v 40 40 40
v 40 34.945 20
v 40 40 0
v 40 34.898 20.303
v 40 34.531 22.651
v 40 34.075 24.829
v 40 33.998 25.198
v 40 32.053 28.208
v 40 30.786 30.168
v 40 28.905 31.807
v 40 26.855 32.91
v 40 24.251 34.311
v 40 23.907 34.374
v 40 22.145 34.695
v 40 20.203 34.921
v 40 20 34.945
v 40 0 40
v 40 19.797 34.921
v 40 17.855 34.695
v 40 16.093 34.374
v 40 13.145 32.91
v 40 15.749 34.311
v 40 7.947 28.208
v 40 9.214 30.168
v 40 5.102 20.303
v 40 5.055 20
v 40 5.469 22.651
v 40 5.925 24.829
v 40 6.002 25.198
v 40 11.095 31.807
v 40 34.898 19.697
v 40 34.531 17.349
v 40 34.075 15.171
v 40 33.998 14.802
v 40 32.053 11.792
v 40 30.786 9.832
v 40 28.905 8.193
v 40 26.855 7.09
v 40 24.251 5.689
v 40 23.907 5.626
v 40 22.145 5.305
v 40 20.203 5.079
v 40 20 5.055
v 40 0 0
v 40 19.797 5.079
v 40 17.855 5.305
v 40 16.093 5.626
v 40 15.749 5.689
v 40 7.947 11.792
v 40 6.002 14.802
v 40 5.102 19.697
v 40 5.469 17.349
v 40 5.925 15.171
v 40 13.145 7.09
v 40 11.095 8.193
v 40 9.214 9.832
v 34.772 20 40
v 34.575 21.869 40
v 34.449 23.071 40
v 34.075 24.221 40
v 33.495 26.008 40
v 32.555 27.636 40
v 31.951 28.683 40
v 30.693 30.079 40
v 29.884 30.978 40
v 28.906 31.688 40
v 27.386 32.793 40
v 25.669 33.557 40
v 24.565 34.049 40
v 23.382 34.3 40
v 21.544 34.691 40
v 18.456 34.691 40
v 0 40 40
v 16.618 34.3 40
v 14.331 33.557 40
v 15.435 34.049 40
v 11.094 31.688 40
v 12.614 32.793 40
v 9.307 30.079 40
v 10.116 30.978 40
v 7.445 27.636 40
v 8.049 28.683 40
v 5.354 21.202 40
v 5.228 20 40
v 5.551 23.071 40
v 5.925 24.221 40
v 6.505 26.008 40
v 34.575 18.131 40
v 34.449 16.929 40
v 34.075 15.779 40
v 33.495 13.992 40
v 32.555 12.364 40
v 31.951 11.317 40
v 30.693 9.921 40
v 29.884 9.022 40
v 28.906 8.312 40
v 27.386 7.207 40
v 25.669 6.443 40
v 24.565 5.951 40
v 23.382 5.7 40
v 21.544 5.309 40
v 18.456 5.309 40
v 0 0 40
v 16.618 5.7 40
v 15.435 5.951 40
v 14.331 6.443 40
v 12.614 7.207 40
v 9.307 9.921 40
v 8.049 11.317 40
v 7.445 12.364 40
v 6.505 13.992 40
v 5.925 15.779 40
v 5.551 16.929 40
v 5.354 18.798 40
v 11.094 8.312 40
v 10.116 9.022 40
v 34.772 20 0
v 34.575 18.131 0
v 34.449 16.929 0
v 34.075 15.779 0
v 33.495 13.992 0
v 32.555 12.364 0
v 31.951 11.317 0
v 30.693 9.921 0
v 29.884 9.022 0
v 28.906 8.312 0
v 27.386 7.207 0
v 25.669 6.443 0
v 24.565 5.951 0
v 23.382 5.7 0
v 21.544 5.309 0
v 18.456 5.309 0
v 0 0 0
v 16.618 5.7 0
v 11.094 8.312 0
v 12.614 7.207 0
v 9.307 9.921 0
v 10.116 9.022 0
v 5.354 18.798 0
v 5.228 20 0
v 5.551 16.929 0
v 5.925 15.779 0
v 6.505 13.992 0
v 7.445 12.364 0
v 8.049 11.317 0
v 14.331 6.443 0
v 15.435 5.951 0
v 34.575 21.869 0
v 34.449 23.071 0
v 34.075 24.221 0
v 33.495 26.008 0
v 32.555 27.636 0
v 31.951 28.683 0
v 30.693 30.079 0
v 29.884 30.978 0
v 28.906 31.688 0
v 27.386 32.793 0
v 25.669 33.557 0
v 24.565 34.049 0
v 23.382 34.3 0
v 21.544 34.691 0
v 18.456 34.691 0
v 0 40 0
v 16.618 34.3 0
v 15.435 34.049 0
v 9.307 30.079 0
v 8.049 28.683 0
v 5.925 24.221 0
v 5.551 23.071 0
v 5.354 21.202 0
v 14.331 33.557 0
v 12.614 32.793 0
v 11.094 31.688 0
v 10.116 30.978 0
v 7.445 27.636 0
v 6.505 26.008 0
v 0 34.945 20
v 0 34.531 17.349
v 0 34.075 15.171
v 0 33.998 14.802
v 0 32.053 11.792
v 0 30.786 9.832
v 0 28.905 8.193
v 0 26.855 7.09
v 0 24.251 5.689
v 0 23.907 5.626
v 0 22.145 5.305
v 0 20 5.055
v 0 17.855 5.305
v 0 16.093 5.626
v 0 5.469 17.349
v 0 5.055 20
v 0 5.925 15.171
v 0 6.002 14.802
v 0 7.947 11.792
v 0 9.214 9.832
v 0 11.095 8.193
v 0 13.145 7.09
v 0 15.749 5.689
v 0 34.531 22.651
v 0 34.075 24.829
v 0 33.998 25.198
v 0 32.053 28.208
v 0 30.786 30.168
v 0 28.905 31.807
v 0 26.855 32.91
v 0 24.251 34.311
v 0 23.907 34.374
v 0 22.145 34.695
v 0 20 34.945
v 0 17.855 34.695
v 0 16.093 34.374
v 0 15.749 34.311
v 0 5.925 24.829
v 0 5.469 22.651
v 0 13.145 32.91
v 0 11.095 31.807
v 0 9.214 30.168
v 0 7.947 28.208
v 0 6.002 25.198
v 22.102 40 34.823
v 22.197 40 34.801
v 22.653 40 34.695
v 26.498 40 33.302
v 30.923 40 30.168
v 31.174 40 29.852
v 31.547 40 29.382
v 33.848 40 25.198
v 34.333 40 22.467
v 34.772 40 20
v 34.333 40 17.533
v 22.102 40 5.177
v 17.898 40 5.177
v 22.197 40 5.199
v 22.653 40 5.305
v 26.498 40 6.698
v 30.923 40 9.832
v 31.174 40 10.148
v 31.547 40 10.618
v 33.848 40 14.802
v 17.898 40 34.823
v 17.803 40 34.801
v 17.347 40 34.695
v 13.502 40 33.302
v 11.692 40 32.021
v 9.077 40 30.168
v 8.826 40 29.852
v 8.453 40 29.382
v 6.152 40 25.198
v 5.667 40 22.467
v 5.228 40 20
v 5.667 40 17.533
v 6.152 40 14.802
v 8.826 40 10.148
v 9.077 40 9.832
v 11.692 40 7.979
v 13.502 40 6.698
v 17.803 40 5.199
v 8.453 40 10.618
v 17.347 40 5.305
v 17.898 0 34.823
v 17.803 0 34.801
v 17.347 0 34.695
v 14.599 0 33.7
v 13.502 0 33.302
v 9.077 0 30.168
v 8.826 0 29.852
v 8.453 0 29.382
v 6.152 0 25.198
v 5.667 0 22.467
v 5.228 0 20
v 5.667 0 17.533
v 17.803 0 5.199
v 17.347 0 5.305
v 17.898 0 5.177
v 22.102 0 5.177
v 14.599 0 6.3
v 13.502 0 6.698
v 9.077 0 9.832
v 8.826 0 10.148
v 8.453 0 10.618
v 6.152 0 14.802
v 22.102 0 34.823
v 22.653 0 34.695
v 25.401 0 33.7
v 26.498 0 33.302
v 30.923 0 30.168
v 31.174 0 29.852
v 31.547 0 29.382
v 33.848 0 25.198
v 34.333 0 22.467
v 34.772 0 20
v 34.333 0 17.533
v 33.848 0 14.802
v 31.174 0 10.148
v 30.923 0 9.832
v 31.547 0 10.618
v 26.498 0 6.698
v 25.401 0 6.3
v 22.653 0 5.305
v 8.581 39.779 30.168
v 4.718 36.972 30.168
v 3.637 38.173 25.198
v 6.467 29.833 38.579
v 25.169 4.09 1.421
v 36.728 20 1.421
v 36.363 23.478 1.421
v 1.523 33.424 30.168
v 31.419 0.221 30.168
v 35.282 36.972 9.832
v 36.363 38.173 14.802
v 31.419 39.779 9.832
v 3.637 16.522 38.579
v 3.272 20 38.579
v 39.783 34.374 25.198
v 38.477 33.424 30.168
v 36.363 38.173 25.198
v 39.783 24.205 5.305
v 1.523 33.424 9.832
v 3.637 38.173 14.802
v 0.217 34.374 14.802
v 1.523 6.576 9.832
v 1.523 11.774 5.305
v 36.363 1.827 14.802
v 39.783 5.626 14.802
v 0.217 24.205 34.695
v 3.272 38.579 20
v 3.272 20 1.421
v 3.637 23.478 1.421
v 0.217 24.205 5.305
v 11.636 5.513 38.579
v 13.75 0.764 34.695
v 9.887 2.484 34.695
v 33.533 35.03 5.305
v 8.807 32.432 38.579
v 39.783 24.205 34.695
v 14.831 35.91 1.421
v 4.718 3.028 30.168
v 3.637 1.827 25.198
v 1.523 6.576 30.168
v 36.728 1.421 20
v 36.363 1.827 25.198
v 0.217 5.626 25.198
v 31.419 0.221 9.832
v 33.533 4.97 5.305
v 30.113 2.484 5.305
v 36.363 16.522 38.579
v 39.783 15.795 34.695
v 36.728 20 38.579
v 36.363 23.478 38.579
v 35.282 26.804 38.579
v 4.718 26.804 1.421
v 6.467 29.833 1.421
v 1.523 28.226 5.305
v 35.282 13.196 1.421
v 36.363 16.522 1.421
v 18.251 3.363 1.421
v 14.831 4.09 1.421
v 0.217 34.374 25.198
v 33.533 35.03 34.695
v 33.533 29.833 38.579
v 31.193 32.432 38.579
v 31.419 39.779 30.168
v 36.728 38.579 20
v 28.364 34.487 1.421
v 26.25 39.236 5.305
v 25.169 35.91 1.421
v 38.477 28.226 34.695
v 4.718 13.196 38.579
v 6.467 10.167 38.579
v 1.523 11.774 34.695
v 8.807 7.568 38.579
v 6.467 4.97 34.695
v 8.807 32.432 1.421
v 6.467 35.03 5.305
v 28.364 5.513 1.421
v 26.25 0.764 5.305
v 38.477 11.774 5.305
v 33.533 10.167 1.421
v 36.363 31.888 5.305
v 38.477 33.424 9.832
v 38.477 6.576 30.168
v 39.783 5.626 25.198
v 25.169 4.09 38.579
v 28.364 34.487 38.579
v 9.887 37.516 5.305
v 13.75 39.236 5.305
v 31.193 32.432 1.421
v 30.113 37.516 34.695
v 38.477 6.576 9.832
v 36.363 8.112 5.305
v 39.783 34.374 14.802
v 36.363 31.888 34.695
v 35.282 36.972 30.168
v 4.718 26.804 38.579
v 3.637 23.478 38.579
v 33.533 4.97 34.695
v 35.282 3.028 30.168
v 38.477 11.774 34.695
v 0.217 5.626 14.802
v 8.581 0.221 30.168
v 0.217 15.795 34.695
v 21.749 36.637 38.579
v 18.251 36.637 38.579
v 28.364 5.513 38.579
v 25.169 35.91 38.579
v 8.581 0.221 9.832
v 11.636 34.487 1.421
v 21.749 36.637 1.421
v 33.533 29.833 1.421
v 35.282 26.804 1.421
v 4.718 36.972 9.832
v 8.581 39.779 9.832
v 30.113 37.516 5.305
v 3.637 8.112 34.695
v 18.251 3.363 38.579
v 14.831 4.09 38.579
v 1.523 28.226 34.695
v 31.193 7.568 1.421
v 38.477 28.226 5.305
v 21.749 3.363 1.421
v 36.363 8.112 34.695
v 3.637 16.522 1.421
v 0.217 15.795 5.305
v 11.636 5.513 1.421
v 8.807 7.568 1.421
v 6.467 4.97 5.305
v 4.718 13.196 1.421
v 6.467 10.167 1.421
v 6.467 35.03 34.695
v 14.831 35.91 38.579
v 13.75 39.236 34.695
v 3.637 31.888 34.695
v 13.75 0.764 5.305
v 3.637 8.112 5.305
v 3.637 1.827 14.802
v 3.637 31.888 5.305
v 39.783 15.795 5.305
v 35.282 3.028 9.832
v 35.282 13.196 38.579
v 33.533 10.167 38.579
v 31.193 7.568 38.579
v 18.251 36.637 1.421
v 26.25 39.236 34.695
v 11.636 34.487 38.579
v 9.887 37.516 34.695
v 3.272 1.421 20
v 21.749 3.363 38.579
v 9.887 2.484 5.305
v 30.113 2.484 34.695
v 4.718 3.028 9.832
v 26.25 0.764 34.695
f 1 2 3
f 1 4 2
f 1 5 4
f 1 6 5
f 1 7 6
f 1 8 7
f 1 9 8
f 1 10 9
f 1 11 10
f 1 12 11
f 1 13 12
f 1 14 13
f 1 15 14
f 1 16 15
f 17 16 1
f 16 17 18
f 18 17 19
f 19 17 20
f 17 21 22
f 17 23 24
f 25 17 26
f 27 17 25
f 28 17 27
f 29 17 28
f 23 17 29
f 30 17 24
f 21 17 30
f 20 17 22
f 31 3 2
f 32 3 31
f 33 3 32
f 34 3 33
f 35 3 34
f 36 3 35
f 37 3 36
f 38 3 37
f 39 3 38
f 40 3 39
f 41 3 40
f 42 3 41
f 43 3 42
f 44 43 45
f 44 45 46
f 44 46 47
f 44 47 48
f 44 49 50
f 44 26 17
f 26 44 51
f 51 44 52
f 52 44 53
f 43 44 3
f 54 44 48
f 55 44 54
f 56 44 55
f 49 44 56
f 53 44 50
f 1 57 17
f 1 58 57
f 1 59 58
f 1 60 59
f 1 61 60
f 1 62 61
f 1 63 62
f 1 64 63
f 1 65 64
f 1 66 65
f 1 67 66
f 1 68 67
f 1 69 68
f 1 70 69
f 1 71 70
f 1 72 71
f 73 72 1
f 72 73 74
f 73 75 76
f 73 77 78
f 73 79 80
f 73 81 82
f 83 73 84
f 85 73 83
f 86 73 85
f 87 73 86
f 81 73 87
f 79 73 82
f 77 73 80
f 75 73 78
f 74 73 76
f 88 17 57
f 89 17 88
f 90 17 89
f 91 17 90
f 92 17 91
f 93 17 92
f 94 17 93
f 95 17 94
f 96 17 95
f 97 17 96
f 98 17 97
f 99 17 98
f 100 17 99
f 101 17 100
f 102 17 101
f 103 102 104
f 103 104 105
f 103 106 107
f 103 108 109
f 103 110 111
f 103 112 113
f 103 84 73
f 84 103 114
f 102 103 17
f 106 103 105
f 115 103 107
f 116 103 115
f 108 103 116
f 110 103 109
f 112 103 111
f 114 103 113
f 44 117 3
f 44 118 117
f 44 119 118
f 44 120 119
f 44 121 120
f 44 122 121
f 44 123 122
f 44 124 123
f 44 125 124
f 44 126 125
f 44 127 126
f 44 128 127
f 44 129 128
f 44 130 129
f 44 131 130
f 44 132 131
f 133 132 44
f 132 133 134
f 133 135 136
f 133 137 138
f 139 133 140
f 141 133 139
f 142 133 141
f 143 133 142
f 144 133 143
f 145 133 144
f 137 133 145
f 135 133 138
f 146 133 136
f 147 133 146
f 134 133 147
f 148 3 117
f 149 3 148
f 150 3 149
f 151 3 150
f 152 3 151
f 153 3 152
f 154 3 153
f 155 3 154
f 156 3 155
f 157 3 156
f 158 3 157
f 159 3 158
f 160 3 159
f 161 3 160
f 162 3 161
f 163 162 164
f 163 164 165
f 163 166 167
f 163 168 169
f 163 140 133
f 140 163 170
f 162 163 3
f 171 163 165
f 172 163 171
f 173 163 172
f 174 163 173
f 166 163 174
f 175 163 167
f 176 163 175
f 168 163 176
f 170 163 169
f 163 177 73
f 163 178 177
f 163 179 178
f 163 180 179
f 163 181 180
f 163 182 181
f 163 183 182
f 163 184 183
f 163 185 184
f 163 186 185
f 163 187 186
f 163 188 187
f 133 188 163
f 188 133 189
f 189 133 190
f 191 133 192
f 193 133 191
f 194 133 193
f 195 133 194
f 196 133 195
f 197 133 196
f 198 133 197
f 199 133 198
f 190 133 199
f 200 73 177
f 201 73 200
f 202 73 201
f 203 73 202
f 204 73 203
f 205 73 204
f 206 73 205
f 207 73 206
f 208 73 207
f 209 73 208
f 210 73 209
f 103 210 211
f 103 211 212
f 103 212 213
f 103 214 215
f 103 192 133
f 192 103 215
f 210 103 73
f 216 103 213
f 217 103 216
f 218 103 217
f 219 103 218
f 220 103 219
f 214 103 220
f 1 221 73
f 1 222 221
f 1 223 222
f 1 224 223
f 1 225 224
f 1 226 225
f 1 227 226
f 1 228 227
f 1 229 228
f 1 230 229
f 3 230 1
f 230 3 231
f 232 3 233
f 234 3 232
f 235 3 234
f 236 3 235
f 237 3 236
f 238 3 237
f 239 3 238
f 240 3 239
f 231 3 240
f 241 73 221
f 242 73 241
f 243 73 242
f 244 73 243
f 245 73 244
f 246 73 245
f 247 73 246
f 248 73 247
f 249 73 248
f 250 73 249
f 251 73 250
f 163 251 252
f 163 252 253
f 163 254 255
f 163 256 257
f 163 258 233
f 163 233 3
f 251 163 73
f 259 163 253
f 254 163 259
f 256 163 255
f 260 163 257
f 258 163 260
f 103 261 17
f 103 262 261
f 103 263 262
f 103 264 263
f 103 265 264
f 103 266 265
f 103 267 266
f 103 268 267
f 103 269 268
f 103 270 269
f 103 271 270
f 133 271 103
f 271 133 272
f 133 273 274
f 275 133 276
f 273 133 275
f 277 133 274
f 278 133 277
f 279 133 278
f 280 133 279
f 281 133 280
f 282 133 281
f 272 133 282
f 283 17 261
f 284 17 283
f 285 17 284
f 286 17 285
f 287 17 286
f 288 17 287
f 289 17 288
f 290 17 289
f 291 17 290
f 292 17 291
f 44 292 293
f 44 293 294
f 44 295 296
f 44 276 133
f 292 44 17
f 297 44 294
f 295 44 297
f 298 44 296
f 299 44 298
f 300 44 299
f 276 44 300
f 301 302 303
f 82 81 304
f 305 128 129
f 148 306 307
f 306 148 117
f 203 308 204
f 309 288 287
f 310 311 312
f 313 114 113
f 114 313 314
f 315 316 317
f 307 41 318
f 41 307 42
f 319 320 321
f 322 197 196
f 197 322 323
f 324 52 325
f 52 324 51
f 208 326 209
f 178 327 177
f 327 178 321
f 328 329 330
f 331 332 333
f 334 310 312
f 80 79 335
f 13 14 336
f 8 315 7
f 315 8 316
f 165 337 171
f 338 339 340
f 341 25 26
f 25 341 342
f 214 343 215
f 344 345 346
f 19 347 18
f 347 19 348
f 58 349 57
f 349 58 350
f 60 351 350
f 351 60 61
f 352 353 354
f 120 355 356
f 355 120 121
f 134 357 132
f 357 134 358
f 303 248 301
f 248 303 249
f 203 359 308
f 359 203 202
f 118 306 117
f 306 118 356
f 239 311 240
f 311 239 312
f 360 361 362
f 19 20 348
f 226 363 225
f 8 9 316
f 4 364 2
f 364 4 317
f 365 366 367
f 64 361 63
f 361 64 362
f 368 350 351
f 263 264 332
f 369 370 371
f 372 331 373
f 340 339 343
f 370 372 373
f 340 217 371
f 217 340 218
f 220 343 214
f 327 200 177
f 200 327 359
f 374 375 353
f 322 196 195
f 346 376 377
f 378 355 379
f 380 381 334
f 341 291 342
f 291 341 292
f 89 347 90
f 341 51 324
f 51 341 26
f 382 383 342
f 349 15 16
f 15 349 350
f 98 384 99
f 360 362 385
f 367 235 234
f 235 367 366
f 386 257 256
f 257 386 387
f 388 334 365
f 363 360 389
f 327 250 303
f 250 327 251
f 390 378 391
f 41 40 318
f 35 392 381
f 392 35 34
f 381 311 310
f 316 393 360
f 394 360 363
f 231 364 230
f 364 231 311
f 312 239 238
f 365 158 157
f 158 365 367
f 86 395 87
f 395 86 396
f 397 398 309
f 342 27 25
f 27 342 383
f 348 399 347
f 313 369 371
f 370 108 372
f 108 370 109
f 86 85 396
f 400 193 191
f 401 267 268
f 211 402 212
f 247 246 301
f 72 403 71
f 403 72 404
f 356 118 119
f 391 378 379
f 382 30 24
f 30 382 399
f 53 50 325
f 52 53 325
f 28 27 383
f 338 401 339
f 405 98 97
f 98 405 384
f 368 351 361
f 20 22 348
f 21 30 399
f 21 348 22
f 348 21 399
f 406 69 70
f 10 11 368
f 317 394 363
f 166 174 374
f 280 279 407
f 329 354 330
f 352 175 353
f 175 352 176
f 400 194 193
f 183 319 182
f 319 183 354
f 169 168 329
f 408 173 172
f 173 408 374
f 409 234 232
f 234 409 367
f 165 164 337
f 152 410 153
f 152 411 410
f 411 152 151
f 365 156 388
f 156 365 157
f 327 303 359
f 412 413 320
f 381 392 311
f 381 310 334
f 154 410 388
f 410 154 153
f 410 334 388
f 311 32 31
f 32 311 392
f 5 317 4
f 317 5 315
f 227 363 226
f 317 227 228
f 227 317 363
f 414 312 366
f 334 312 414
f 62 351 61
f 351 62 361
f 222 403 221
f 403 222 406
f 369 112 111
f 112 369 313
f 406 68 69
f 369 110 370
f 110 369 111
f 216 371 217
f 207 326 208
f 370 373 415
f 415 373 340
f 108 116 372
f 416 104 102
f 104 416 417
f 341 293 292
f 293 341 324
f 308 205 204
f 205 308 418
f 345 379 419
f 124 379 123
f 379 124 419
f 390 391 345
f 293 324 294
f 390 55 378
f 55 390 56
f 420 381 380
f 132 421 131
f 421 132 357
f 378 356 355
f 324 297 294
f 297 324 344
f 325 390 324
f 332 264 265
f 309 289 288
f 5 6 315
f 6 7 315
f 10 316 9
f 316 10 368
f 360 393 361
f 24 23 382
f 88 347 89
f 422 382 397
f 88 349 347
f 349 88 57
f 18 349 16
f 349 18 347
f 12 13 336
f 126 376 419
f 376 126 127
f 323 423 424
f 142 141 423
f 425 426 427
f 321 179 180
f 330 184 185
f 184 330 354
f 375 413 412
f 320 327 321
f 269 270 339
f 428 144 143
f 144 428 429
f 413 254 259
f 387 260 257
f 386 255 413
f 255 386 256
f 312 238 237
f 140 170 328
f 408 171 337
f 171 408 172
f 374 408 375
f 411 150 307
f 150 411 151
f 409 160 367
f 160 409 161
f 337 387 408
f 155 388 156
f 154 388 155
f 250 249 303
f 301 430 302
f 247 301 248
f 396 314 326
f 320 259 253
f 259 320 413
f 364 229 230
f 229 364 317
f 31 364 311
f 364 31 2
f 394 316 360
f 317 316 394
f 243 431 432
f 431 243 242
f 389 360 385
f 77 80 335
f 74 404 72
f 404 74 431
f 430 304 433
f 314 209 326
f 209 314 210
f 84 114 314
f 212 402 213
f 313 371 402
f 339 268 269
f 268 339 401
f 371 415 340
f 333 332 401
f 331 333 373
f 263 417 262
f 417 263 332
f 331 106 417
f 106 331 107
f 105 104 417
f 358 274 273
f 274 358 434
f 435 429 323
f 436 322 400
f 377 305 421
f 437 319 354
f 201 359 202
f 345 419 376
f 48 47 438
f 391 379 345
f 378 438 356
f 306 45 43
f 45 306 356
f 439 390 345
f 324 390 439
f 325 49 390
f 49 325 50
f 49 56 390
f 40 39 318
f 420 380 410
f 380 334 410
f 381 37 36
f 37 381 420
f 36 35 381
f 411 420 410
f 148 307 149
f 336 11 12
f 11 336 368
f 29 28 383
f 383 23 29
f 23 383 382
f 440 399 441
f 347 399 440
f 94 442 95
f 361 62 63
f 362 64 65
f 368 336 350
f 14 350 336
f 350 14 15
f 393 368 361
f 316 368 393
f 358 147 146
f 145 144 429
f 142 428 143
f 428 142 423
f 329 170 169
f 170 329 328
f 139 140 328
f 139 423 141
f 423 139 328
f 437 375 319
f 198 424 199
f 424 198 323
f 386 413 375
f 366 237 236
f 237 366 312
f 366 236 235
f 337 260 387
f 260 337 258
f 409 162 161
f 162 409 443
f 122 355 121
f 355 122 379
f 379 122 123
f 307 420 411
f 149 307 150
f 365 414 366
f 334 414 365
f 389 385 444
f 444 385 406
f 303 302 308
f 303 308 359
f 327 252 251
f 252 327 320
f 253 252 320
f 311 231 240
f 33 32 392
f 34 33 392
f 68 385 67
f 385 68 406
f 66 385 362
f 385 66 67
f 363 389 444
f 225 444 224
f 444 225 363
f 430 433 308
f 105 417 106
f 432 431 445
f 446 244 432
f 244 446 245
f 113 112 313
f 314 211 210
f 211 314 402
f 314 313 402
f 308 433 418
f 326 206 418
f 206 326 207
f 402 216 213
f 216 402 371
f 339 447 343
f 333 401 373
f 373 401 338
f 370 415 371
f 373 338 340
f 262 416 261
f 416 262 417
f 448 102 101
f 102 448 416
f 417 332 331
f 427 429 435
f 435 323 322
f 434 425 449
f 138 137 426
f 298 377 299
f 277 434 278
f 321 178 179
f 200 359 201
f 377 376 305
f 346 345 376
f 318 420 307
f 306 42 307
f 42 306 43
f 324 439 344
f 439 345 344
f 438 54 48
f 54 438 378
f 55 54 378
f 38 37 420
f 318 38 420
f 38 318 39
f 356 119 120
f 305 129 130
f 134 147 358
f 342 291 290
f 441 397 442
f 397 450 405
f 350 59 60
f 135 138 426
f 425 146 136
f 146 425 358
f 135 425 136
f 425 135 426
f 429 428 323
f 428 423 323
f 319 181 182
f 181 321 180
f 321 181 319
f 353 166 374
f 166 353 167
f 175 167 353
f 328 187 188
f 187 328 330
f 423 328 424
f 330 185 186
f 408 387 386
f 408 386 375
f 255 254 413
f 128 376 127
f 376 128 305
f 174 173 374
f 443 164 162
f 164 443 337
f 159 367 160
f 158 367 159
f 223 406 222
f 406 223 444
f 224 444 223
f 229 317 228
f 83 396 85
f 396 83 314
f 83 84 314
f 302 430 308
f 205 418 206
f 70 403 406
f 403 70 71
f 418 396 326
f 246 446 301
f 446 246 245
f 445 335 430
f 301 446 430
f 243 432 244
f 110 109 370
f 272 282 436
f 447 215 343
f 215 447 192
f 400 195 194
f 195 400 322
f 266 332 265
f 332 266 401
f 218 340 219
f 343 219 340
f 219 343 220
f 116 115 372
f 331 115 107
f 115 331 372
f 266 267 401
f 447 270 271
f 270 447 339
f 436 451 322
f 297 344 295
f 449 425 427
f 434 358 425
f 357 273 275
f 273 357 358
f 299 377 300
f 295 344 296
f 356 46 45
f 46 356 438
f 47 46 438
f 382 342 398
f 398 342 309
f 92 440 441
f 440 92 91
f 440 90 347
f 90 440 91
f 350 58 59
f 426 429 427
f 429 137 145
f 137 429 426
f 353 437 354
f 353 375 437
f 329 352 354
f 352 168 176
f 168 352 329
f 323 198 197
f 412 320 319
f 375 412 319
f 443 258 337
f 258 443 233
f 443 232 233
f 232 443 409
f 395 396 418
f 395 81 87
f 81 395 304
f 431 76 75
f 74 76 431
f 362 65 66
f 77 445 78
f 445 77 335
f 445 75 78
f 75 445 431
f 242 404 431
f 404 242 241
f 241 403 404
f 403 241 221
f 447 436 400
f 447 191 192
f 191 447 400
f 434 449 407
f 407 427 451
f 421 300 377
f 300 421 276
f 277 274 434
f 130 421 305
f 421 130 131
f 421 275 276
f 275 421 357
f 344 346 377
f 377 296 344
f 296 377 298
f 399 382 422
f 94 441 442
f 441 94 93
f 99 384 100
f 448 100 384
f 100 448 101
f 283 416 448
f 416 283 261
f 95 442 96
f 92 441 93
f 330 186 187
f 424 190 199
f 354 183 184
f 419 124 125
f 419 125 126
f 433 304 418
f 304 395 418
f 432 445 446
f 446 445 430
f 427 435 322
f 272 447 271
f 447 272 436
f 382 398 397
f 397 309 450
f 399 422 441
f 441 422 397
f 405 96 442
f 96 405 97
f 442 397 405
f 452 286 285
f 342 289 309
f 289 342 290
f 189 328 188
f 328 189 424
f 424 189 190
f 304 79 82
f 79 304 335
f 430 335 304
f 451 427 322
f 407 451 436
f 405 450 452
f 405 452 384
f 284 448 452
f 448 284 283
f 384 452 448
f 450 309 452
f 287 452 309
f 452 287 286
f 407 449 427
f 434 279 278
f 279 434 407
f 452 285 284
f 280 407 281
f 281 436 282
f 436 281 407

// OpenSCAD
difference(){
cube([40, 40, 40], center=false);
translate([20, 20, 20]){
sphere(r=25);
}
}
